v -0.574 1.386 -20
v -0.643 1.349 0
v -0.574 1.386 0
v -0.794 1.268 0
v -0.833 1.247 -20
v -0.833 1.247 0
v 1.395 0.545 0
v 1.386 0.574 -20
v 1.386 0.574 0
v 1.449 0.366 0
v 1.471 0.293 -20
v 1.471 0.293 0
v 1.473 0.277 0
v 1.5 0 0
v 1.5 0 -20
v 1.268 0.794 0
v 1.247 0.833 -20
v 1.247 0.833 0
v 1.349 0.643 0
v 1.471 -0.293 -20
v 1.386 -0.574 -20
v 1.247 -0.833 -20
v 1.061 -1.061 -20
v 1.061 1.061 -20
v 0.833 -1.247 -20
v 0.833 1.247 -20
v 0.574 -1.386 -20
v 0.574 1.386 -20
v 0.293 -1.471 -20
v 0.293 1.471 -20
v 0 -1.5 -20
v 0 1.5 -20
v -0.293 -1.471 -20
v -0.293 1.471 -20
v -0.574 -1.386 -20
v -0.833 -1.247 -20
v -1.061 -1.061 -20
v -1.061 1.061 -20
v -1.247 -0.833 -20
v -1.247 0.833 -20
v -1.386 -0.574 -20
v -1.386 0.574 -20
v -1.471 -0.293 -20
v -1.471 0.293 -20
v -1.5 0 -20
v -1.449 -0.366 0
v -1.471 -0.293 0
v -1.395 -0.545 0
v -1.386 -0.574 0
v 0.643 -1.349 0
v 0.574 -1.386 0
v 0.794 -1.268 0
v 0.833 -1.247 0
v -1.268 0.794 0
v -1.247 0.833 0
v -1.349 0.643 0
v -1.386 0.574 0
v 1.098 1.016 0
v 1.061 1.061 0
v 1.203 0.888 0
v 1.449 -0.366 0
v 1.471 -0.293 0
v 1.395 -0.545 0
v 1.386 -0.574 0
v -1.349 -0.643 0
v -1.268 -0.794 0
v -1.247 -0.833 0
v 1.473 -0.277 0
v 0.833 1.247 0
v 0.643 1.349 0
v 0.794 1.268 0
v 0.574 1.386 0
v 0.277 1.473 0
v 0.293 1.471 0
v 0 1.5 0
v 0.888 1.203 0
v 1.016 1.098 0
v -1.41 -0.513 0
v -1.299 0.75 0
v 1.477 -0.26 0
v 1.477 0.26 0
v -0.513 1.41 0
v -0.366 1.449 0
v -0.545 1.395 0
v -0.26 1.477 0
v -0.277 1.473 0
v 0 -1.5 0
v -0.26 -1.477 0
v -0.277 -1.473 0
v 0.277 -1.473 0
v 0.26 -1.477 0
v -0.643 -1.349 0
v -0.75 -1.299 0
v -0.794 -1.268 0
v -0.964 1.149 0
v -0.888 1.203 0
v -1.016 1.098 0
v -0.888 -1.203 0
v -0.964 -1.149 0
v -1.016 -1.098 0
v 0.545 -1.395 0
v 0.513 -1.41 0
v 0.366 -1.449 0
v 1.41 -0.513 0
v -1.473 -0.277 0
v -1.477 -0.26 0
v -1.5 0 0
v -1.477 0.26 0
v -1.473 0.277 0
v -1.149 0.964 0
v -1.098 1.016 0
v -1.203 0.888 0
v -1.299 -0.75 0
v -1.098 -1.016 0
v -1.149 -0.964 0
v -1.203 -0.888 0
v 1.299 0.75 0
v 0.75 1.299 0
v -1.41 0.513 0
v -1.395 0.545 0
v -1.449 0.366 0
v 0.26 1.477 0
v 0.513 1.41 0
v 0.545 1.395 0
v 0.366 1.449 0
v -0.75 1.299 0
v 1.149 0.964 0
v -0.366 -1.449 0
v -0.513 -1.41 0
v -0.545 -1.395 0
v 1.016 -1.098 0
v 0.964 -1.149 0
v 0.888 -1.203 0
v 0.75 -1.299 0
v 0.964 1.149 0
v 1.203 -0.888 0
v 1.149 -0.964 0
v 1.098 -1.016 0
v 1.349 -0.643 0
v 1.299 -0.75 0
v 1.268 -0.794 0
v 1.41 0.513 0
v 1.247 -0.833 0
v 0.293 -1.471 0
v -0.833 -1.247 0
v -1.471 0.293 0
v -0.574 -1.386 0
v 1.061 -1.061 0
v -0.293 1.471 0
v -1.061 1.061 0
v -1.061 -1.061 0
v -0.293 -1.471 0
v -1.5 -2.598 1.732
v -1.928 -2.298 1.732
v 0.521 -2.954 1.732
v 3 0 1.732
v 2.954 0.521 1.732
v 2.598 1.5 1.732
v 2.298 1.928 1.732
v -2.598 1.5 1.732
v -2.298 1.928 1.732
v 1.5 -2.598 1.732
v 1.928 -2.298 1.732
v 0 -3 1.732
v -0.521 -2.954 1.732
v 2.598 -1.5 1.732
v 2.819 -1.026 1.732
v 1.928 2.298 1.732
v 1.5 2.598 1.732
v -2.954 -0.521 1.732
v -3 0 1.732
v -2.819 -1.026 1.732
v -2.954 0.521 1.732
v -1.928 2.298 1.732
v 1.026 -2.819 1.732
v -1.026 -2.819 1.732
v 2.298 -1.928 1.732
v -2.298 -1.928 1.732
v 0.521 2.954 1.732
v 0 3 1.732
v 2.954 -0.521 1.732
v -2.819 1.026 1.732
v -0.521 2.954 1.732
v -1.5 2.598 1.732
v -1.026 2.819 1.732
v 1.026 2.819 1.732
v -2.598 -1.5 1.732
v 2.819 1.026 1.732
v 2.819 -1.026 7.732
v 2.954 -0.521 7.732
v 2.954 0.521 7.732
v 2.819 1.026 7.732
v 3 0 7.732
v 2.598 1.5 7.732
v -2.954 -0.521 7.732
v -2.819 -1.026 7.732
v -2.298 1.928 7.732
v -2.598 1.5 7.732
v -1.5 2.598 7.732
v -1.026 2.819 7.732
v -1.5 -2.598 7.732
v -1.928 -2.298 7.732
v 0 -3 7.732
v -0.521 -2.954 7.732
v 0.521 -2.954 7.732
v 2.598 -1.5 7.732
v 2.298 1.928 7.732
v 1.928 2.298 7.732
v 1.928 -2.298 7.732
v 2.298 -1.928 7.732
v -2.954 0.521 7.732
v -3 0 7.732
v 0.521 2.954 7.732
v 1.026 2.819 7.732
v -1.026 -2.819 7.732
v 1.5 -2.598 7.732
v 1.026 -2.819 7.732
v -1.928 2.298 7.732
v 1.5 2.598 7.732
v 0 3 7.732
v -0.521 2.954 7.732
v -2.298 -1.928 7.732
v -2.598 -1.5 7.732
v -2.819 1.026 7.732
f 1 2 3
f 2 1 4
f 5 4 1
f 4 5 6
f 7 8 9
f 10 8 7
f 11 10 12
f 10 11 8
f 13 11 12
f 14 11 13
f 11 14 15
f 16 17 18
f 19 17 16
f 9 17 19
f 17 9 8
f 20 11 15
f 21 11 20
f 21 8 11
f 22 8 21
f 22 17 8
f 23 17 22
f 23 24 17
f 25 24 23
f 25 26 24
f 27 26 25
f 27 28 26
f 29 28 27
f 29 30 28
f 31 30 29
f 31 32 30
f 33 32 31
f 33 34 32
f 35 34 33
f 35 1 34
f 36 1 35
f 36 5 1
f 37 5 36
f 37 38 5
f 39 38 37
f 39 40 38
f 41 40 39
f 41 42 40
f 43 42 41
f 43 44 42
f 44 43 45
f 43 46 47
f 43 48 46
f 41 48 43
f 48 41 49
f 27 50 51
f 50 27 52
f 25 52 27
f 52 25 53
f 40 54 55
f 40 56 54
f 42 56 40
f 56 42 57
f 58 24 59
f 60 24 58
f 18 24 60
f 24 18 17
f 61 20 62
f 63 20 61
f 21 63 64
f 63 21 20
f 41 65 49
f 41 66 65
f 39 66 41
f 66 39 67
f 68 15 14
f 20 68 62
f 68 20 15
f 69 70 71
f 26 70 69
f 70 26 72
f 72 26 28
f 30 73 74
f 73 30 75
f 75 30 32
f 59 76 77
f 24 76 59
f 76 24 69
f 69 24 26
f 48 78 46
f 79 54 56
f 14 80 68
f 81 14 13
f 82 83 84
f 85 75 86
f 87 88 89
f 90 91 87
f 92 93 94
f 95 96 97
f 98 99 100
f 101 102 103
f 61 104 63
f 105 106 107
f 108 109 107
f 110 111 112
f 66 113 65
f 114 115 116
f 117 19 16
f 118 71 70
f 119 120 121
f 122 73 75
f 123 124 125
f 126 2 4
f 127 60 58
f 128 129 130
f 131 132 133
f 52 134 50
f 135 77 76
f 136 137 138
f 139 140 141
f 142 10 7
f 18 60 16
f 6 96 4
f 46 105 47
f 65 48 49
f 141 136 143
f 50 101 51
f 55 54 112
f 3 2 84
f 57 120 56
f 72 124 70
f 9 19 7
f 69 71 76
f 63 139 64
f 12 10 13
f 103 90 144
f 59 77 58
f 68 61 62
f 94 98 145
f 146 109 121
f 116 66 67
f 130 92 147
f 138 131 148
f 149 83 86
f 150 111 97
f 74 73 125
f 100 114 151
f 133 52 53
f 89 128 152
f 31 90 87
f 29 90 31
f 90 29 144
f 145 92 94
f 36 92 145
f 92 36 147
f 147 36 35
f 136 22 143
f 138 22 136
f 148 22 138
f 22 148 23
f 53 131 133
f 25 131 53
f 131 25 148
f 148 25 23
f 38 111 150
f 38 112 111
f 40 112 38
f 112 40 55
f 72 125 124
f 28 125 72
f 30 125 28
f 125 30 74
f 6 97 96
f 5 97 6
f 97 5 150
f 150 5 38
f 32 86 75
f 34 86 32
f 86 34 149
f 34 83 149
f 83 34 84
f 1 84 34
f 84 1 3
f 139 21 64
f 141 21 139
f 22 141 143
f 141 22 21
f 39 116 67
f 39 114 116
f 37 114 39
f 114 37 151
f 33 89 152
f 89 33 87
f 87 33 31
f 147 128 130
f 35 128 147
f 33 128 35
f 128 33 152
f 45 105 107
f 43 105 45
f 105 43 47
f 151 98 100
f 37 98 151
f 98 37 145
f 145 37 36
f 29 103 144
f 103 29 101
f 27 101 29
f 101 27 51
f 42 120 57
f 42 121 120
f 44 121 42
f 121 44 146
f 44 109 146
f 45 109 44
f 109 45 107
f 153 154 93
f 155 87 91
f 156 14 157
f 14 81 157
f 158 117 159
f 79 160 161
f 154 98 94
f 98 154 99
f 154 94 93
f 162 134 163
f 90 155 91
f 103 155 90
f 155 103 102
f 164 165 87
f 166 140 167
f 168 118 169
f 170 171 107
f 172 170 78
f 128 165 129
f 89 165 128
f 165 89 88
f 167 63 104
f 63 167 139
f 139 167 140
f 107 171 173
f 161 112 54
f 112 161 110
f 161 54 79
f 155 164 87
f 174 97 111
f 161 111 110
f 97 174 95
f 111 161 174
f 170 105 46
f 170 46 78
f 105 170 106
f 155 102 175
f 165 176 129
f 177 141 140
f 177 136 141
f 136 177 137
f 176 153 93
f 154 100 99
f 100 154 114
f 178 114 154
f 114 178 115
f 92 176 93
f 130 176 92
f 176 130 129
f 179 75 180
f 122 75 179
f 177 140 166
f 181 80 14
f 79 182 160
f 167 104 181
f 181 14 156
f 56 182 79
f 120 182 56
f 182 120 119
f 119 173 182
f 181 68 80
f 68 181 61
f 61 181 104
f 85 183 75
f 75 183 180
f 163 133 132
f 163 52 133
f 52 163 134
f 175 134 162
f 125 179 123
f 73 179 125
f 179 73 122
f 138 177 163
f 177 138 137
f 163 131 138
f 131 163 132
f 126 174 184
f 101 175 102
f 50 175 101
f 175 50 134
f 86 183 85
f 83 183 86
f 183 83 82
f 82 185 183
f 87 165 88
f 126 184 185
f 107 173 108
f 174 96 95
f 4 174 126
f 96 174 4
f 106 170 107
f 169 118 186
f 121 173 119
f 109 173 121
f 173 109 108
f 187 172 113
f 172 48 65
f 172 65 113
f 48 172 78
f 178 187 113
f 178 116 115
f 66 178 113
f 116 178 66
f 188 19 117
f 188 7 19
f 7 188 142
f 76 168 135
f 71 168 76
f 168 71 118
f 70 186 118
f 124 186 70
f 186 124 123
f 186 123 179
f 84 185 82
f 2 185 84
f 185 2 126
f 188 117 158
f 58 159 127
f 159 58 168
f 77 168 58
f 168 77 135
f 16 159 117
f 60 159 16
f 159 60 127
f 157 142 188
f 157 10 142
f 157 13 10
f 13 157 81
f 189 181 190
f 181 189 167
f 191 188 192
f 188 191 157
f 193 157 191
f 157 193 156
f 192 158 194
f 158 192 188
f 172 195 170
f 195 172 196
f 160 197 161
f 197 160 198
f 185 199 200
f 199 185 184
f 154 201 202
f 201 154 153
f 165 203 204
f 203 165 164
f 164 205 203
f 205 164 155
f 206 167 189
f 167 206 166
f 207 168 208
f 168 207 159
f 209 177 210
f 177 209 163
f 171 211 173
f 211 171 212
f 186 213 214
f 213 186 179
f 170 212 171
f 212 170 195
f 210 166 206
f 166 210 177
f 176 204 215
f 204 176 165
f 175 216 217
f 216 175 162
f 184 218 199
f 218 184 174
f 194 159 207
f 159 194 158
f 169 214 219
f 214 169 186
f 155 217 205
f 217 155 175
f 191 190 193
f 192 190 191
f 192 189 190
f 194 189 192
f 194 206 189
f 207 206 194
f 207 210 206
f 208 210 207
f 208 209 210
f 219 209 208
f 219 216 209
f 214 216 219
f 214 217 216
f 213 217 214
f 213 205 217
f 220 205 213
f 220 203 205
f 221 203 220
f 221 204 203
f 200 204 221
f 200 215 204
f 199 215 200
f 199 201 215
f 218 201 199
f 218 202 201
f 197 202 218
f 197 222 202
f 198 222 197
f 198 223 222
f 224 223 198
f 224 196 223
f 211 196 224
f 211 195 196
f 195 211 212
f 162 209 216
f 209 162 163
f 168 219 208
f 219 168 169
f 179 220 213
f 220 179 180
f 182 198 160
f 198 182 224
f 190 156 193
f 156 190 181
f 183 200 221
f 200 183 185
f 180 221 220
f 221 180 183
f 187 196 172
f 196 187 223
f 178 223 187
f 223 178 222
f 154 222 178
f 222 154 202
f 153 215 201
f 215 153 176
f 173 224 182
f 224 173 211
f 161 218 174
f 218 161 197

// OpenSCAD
// file: design.scad
use <utils.scad>;

Pi = 3.141592653589793;
dt = .25;
dTHETA = 3;

A = 1;
A_in = A; //A;
A_out = A; //A;
wall_t = .66;
t = 4;

wx = 57.5; //echo(15 + 35 + 1.5 + 2 + 4);
wy = 69; //battery width 65mm + spacings
//wx = 58; //echo(15 + 35 + 1.5 + 2 + 4);
//wy = 77; //battery width 65mm + spacings

r_corner = wx/10;
H_ = 132; //124; //124; 150; //
ni = floor(H_/ t);
H = t*(ni+1);
sc = 1.;
sc2 = 1.;
mid = .65;
w_rim = 4;     
a = floor(t/dt);
echo("a = ", a);
echo("Height = ", H);


    
// BOTS:
d3bolt = 3;
d3bolt_t = 2.8;

// NEMA
nema_spacing = .3;
nema14_x = 35.2 + nema_spacing;
nema14_y = 35.2 + nema_spacing;
nema14_z = 23.0 + nema_spacing;
corner_cut = 2  + nema_spacing;
nema_L_axle = 17;
nema_r_axle = 5/2  + nema_spacing;
nema_bolt_d = d3bolt;
nema_L_bolt = 5;

middle_cyl_r = 11  + nema_spacing;
middle_cyl_h = 2  + nema_spacing;

// DUE dimensions:
due_width = 53.21;
due_length = 104.47;
due_hole_w = 48.26;
due_d_bolt = d3bolt;


move_up = due_length - 15.24 - 6.68 + 6;
x_hole_due  = due_hole_w/2;
hole_coord_due = [[-x_hole_due, move_up, 0], 
                  [x_hole_due, move_up-1.27, 0],
                  [x_hole_due, move_up-76.43, 0],  
                  [-x_hole_due + 5 + 27.94, move_up-76.43 + 24.13, 0],  
                  [-x_hole_due, move_up-82.55, 0],
                  [-x_hole_due + 5, move_up-82.55 + 30.48, 0]
                  ];
                  
bolt_coord_due = [[-x_hole_due, move_up, 0], 
                  //[x_hole_due, move_up-1.27, 0],
                  //[x_hole_due, move_up-76.43, 0],  
                  [-x_hole_due + 5 + 27.94, move_up-76.43 + 24.13, 0],  
                  [-x_hole_due, move_up-82.55, 0],
                  [-x_hole_due + 5, move_up-82.55 + 30.48, 0]];

// rpi dimensions:
rpi_width = 31;
rpi_length = 69;
rpi_hole_w = 23;
rpi_hole_l = 58;
rpi_d_bolt = 2.8;

x_hole_rpi  = rpi_hole_w/2;
hole_coord_rpi = [[-x_hole_rpi, 0, 0], [x_hole_rpi, 0, 0], [-x_hole_rpi, rpi_hole_l, 0],  [x_hole_rpi, rpi_hole_l, 0]];
bolt_coord_rpi = hole_coord_rpi;


// converter params:
hole_coord_dcdc = [[-35/2, 2.5, 0], [35/2, 19 + 2.5, 0]];
bolt_coord_dcdc = hole_coord_dcdc;
h_dcdc = 25;

// HAND PARAMS:
sc_hand = 1.;
sc2_hand = 1;
wx_hand = 14;
wy_hand = wx_hand;
r_corner_hand = wx_hand/8;
L_hand = 72;
ni_hand = ceil(L_hand/t);
mid_hand = .8;
rot_hand = 0;
//hand_axle_h = H - nema14_x/2 - 26;
//hand_axle_h = t + 3*nema14_x/2 + 27;
hand_axle_h = H - nema14_x/2 - 2*t; 
hand_z = hand_axle_h; // -ni_hand*t;
t_motor_mount = 4;
hand_shift = 6;
hand_y = wy/2 + wy_hand - 2*t_motor_mount;
axle_x = wx/2 - nema14_x/2 - 1.5;
bolt_wall_t = .7;


// Battery Params
bat_x = 55;
bat_y = 27;
bat_z = 30;
backBattSpace = .5;
hBattBag = 10*t;


echo("Top h = ", H - hand_axle_h - nema14_x/2);

// STEPPER CONTROLLERS
x_hole_stepper = wx/2 - r_corner;
stepper_z0 = t + nema14_x + t;
stepper_z1 = hand_axle_h - nema14_x/2 - t;
stepper_h = stepper_z1 - stepper_z0;


//hole_coord_step = [for (i=[-1,1]) for (j=[0,1]) [i*x_hole_stepper, stepper_z0 + j*stepper_h]];
//bolt_coord_step = hole_coord_step;
hole_coord_step = [];
bolt_coord_step = hole_coord_step;

// BATTERY MOUNT
x_hole_battery = 0;
battery_z0 = t + nema14_x - t;
battery_z1 = hand_axle_h - nema14_x/2 + t;
battery_h = battery_z1 - battery_z0;

hole_coord_battery = [for (j=[0,1]) [x_hole_battery, battery_z0 + j*battery_h]];
bolt_coord_battery = hole_coord_battery;



// MPU6050 GYRO
hole_x_mpu = 0;
hole_y_mpu = 8;
hole_coord_mpu = [for (j=[-1,1])[hole_x_mpu, j*hole_y_mpu]];
bolt_coord_mpu = hole_coord_mpu;

// LEG PARAMS
sc_leg = 1;
sc2_leg = 1.;
mid_leg = .6;
wx_leg = 22;
wy_leg = wx_leg;
r_corner_leg = 2;
ni_leg = 6;
wheel_angle = 0;
//leg_y = wy/2*sc + wy_leg - t_motor_mount - t_motor_mount;

// HEAD PARAMS:
spacing = 4; // distance between rpi and walls
wx_head = rpi_width + wall_t*2 + spacing;
wy_head = wx_head;
r_corner_head = wx_head/10;
ni_head = ceil(75/t);
head_x = -14; //-7

sc_head = 1;
sc2_head = 1;
mid_head = .5;
w_rim_head = w_rim;
heights_head = heights(sc_head, sc2_head, mid_head, t, wx_head, ni_head);

/*
// BACKBAG PARAMS:
wx_backbag = bat_y + 4*wall_t; // + w_rim*2; //wx; //rpi_width + wall_t*2 + spacing;
wy_backbag = bat_x + 4*wall_t; // + w_rim*2; // 54 + 25; //wy*1.1;
r_corner_backbag = wx_backbag/10;

ni_backbag = ceil((2*bat_z)/t);
backbag_x = -7;

sc_backbag = 1;
sc2_backbag = 1;
mid_backbag = .5;
w_rim_backbag = w_rim;
heights_backbag = heights(sc_backbag, sc2_backbag, mid_backbag, t, wx_backbag, ni_backbag);
backbag_H = H - ni_backbag*t - 2*t;
*/

// NECK PARAMS
neck_t = 18;
axle_wall_t = 8;
neck_axle_d = 3.15;
r_pivot_circle = neck_axle_d/2 + axle_wall_t;

neck_h = wx_head/2 + A_out + 4;
axle_d_from_wall = 1;
neck_width = 23.5;

neck_pivot_angle_min = -5;
neck_pivot_angle_max = 60;

// COVER PARAMS
thickness_bottom = 2;
bottom_rim_w = 1;
//lid_spacing_scale = .0;
lid_spacing = .3;
switch_d = 5;


// MISC PARAMS
heights_ = heights(sc, sc2, mid, t, wx, ni);
el_mount_h = 3.5;
bolt_sink = 1.2;
// file: utils.scad
use <wigleUnit.scad>;
//include <design.scad>;


dt_utils = .3;
dTHETA_utils = 10;

function get_bolt_sink(boltD, add) = boltD/2 + add;

function add(v, i = 0, r = 0) = i < len(v) ? add(v, i + 1, r + v[i]) : r;

function select(vector,indices) = [ for (index = indices) vector[index] ];


function width_scale(sc,sc2, x, mid) = 1 + x*(pow(mid,3)*sc2 - pow(mid,3) + 3*mid - sc*(3*mid - 2)-2)/(mid*(pow(mid,2) - 2*mid + 1)) + pow(x,3)*(pow(mid,2)*sc2 - pow(mid,2) + 2*mid - sc*(2*mid-1) - 1)/(pow(mid,2)*(pow(mid,2) - 2*mid + 1)) + pow(x,2)*(-2*pow(mid,3)*sc2 + 2*pow(mid,3) -3*pow(mid,2) + sc*(3*pow(mid,2) - 1) + 1)/(pow(mid,2)*(pow(mid,2) - 2*mid + 1));


function theta(sc, sc2, i, ni, mid, t, wx) = asin((width_scale(sc,sc2, (i+1)/ni, mid) - width_scale(sc,sc2, i/ni, mid))*wx/(2*t));


function heights(sc, sc2, mid, t, w, ni) = [for (i=[0:1:ni]) t*cos(theta(sc, sc2, i, ni, mid, t, w))];


// shell:
module shell(wall_t, sc, sc2, mid, t, wx, wy, r_corner, ni, A_in, A_out, a){
    heights_ = heights(sc, sc2, mid, t, wx, ni);
    color("DarkSlateGray") 
    union(){
    for (i=[0:1:ni]){
        wx_ = width_scale(sc,sc2, i/ni, mid)*wx;
        wy_ = width_scale(sc,sc2, i/ni, mid)*wy;
        r_corner_ = width_scale(sc,sc2, i/ni, mid)*r_corner;
        
        theta_ = theta(sc, sc2, i, ni, mid, t, wx);
        h = add(select(heights_, [0:1:i-1]));
        translate([0,0,h]) wigle_square(wx_, wy, r_corner, theta_, A_in, A_out, t, wall_t, 0, a);
    }
    }
}

module bolt(L, r, a){
    h_ = 2*r/sqrt(3);
    r2_ = 2*r;
    a = 40;
    cylinder(r = r, h = L, $fn = a);
    translate([0,0,L])cylinder(r1 = r, r2 = r2_, h = h_, $fs = dt_utils/2, $fa = dTHETA_utils);
    translate([0,0,L+h_])cylinder(r1 = r2_, r2 = r2_, h = r2_, $fs = dt_utils/2, $fa = dTHETA_utils);
    }

module bolt_new(L, r, a){
    h_ = 2*r/sqrt(3);
    r2_ = 2*r;
    h_base = 2*r2_;
    
    translate([0,0,-L])cylinder(r = r, h = L, $fs = dt_utils, $fa = dTHETA_utils);
    cylinder(r1 = r, r2 = r2_, h = h_, $fs = dt_utils, $fa = dTHETA_utils);
    translate([0,0,h_])cylinder(r1 = r2_, r2 = r2_, h = h_base, $fs = dt_utils, $fa = dTHETA_utils);
}
    
    
bolt_new(20, 1.5, 20);
// main file
include <utils.scad>;
include <design.scad>;

build = 0;


module wigle_cyl(theta, A_in, A_out, t, wall_t, R, phi0, phi1, cyl, a){
    

    rotate_extrude(angle = phi1 - phi0, $fa = dTHETA, $fs = dt) wigle(theta, A_in, A_out, t, wall_t, R, 0, cyl, a);
    }

module wigle_bar(theta, A_in, A_out, t, wall_t, L, solid, cyl, a){
    translate([0, -9*wall_t, 0]) rotate([90,0,90]) linear_extrude(height = L, $fn = 2)
        
    wigle(theta, A_in, A_out, t, wall_t, 10*wall_t, solid, cyl, a);
}

module wigle(theta, A_in, A_out, t, wall_t, R, solid, cyl, a){
    
    
    // Wigle
    function fx(i,a,A,t, phase) = A*pow(sin(phase + 180*i/a), 2); 
    function fy(i,a,t) = t*i/a;
    
    
    theta_in = solid == 1 ? 0 : theta;
    A_in_ = solid == 1 ? 0 : A_in;
    t_in = solid == 1 ? t*cos(theta) : t;
    
    // SINE CORNER:
    points_in = [for (i=[0:1:a]) [max(0, R + cos(theta_in)*fx(i,a,A_in_,t_in,theta_in/2) + sin(theta_in)*fy(a-i,a,t_in) - wall_t), -sin(theta_in)*fx(i,a,A_in_,t_in,theta_in/2) + cos(theta_in)*fy(a-i,a,t_in)]];
    points_out = [for (i=[0:1:a]) [max(0, R + cos(theta)*fx(i,a,A_out,t, 0) + sin(theta)*fy(i,a,t)), -sin(theta)*fx(i,a,A_out,t,0) + cos(theta)*fy(i,a,t)]];
    points_wigle = concat(points_in, points_out);
    
    
    // SPHERE CORNER:
    function fx_sphere(i,a,t) = t*cos(theta + (90-theta)*i/a) - t*cos(theta); 
    function fy_sphere(i,a,t) = t*sin(theta + (90-theta)*i/a) - t*sin(theta);
    function fy_straight(i,a,t) = i/a*t*(1-sin(theta)); 
    
    points_in_sphere = [for (i=[0:1:a]) [max(0, R - max(wall_t, t*cos(theta))), max(0, fy_straight(i,a,t))]];
    points_out_sphere = [for (i=[a:-1:0]) [max(0, R + fx_sphere(i,a,t)),max(0, fy_sphere(i,a,t))]];
    points_sphere = concat(points_in_sphere, points_out_sphere);
    

    // FULL SPHERE CORNER:
    r = wall_t*cos(theta)/2;
    hy = t - r;
    
    function fx_full_sphere(i,a, t, hy, wall_t, theta) = r*cos(theta + 180*i/a) - hy*sin(theta) + r*cos(-theta); 
    function fy_full_sphere(i,a, t, hy, wall_t, theta) = r*sin(theta + 180*i/a) + hy*cos(-theta);
    
    
    points_full_sphere = [for (i=[0:1:a]) [max(0, R - fx_full_sphere(i,a, t, hy, wall_t, theta)), fy_full_sphere(i,a, t, hy, wall_t, theta)], [R, 0], [R - wall_t, 0]];
    

    // SELECT:    
    points = cyl==0 ? points_wigle : cyl==1 ? points_sphere : cyl==2 ? points_full_sphere : 1;
    
    polygon(points);
    
}


module wigle_wigle_square(wx, wy, r, theta, A_in, A_out, t, wall_t, cyl, a){
      
    
    a1 = r*360/(50*Pi)/t*a;
    echo(a1);
    intersection(){
        wigle_square(wx, wy, r, theta, 0, 0, t, max(wx, wy), 0, a);
        union(){
            for (i=[0:1:max(wx,wy)/t+1]){
                rotate_extrude($fn = a1, $fs = .01) translate([(1+i)*t,0,0]) rotate([0,0,90]) wigle(0, 0, A_out, t, wall_t, wall_t, 0, cyl, a);
            }
        }
    }
}


module wigle_square(wx, wy, r, theta, A_in, A_out, t, wall_t, cyl, a){
    
    module corner(){
        // corner:
        translate([wx/2 - r, wy/2 - r, 0]) wigle_cyl(theta, A_in, A_out, t, wall_t, r, 0, 90, cyl, a);
        
        x_ = wy/2 - wx/2;
        points = [[0, 8*wy], [wy, x_ + wy], [0, wy/2 - wx/2]];
        //sides
        
        wall_t_y = min(wall_t, wy/2);
        solid = wy/2 < wall_t ? 1 : 0;
        intersection(){
            translate([0, wy/2 - wall_t_y, 0]) wigle_bar(theta, A_in, A_out, t, wall_t_y, wx/2 - r, solid, cyl, a);
            linear_extrude(height = t+1) polygon(points);
        }
        
        wall_t_x = min(wall_t, wx/2);
        solid = wx/2 < wall_t ? 1 : 0;
        difference(){
            translate([wx/2 - wall_t_x, 0, 0]) mirror([0,1,0])rotate([0,0,-90]) wigle_bar(theta, A_in, A_out, t, wall_t_x, wy/2 - r, solid, cyl, a);
            linear_extrude(height = t+1) polygon(points);
        }
    }
    
    
    union() {
        corner();
        mirror([1,0,0])corner();
        mirror([0,1,0])corner();
        mirror([1,0,0]) mirror([0,1,0])corner();
    }
}
